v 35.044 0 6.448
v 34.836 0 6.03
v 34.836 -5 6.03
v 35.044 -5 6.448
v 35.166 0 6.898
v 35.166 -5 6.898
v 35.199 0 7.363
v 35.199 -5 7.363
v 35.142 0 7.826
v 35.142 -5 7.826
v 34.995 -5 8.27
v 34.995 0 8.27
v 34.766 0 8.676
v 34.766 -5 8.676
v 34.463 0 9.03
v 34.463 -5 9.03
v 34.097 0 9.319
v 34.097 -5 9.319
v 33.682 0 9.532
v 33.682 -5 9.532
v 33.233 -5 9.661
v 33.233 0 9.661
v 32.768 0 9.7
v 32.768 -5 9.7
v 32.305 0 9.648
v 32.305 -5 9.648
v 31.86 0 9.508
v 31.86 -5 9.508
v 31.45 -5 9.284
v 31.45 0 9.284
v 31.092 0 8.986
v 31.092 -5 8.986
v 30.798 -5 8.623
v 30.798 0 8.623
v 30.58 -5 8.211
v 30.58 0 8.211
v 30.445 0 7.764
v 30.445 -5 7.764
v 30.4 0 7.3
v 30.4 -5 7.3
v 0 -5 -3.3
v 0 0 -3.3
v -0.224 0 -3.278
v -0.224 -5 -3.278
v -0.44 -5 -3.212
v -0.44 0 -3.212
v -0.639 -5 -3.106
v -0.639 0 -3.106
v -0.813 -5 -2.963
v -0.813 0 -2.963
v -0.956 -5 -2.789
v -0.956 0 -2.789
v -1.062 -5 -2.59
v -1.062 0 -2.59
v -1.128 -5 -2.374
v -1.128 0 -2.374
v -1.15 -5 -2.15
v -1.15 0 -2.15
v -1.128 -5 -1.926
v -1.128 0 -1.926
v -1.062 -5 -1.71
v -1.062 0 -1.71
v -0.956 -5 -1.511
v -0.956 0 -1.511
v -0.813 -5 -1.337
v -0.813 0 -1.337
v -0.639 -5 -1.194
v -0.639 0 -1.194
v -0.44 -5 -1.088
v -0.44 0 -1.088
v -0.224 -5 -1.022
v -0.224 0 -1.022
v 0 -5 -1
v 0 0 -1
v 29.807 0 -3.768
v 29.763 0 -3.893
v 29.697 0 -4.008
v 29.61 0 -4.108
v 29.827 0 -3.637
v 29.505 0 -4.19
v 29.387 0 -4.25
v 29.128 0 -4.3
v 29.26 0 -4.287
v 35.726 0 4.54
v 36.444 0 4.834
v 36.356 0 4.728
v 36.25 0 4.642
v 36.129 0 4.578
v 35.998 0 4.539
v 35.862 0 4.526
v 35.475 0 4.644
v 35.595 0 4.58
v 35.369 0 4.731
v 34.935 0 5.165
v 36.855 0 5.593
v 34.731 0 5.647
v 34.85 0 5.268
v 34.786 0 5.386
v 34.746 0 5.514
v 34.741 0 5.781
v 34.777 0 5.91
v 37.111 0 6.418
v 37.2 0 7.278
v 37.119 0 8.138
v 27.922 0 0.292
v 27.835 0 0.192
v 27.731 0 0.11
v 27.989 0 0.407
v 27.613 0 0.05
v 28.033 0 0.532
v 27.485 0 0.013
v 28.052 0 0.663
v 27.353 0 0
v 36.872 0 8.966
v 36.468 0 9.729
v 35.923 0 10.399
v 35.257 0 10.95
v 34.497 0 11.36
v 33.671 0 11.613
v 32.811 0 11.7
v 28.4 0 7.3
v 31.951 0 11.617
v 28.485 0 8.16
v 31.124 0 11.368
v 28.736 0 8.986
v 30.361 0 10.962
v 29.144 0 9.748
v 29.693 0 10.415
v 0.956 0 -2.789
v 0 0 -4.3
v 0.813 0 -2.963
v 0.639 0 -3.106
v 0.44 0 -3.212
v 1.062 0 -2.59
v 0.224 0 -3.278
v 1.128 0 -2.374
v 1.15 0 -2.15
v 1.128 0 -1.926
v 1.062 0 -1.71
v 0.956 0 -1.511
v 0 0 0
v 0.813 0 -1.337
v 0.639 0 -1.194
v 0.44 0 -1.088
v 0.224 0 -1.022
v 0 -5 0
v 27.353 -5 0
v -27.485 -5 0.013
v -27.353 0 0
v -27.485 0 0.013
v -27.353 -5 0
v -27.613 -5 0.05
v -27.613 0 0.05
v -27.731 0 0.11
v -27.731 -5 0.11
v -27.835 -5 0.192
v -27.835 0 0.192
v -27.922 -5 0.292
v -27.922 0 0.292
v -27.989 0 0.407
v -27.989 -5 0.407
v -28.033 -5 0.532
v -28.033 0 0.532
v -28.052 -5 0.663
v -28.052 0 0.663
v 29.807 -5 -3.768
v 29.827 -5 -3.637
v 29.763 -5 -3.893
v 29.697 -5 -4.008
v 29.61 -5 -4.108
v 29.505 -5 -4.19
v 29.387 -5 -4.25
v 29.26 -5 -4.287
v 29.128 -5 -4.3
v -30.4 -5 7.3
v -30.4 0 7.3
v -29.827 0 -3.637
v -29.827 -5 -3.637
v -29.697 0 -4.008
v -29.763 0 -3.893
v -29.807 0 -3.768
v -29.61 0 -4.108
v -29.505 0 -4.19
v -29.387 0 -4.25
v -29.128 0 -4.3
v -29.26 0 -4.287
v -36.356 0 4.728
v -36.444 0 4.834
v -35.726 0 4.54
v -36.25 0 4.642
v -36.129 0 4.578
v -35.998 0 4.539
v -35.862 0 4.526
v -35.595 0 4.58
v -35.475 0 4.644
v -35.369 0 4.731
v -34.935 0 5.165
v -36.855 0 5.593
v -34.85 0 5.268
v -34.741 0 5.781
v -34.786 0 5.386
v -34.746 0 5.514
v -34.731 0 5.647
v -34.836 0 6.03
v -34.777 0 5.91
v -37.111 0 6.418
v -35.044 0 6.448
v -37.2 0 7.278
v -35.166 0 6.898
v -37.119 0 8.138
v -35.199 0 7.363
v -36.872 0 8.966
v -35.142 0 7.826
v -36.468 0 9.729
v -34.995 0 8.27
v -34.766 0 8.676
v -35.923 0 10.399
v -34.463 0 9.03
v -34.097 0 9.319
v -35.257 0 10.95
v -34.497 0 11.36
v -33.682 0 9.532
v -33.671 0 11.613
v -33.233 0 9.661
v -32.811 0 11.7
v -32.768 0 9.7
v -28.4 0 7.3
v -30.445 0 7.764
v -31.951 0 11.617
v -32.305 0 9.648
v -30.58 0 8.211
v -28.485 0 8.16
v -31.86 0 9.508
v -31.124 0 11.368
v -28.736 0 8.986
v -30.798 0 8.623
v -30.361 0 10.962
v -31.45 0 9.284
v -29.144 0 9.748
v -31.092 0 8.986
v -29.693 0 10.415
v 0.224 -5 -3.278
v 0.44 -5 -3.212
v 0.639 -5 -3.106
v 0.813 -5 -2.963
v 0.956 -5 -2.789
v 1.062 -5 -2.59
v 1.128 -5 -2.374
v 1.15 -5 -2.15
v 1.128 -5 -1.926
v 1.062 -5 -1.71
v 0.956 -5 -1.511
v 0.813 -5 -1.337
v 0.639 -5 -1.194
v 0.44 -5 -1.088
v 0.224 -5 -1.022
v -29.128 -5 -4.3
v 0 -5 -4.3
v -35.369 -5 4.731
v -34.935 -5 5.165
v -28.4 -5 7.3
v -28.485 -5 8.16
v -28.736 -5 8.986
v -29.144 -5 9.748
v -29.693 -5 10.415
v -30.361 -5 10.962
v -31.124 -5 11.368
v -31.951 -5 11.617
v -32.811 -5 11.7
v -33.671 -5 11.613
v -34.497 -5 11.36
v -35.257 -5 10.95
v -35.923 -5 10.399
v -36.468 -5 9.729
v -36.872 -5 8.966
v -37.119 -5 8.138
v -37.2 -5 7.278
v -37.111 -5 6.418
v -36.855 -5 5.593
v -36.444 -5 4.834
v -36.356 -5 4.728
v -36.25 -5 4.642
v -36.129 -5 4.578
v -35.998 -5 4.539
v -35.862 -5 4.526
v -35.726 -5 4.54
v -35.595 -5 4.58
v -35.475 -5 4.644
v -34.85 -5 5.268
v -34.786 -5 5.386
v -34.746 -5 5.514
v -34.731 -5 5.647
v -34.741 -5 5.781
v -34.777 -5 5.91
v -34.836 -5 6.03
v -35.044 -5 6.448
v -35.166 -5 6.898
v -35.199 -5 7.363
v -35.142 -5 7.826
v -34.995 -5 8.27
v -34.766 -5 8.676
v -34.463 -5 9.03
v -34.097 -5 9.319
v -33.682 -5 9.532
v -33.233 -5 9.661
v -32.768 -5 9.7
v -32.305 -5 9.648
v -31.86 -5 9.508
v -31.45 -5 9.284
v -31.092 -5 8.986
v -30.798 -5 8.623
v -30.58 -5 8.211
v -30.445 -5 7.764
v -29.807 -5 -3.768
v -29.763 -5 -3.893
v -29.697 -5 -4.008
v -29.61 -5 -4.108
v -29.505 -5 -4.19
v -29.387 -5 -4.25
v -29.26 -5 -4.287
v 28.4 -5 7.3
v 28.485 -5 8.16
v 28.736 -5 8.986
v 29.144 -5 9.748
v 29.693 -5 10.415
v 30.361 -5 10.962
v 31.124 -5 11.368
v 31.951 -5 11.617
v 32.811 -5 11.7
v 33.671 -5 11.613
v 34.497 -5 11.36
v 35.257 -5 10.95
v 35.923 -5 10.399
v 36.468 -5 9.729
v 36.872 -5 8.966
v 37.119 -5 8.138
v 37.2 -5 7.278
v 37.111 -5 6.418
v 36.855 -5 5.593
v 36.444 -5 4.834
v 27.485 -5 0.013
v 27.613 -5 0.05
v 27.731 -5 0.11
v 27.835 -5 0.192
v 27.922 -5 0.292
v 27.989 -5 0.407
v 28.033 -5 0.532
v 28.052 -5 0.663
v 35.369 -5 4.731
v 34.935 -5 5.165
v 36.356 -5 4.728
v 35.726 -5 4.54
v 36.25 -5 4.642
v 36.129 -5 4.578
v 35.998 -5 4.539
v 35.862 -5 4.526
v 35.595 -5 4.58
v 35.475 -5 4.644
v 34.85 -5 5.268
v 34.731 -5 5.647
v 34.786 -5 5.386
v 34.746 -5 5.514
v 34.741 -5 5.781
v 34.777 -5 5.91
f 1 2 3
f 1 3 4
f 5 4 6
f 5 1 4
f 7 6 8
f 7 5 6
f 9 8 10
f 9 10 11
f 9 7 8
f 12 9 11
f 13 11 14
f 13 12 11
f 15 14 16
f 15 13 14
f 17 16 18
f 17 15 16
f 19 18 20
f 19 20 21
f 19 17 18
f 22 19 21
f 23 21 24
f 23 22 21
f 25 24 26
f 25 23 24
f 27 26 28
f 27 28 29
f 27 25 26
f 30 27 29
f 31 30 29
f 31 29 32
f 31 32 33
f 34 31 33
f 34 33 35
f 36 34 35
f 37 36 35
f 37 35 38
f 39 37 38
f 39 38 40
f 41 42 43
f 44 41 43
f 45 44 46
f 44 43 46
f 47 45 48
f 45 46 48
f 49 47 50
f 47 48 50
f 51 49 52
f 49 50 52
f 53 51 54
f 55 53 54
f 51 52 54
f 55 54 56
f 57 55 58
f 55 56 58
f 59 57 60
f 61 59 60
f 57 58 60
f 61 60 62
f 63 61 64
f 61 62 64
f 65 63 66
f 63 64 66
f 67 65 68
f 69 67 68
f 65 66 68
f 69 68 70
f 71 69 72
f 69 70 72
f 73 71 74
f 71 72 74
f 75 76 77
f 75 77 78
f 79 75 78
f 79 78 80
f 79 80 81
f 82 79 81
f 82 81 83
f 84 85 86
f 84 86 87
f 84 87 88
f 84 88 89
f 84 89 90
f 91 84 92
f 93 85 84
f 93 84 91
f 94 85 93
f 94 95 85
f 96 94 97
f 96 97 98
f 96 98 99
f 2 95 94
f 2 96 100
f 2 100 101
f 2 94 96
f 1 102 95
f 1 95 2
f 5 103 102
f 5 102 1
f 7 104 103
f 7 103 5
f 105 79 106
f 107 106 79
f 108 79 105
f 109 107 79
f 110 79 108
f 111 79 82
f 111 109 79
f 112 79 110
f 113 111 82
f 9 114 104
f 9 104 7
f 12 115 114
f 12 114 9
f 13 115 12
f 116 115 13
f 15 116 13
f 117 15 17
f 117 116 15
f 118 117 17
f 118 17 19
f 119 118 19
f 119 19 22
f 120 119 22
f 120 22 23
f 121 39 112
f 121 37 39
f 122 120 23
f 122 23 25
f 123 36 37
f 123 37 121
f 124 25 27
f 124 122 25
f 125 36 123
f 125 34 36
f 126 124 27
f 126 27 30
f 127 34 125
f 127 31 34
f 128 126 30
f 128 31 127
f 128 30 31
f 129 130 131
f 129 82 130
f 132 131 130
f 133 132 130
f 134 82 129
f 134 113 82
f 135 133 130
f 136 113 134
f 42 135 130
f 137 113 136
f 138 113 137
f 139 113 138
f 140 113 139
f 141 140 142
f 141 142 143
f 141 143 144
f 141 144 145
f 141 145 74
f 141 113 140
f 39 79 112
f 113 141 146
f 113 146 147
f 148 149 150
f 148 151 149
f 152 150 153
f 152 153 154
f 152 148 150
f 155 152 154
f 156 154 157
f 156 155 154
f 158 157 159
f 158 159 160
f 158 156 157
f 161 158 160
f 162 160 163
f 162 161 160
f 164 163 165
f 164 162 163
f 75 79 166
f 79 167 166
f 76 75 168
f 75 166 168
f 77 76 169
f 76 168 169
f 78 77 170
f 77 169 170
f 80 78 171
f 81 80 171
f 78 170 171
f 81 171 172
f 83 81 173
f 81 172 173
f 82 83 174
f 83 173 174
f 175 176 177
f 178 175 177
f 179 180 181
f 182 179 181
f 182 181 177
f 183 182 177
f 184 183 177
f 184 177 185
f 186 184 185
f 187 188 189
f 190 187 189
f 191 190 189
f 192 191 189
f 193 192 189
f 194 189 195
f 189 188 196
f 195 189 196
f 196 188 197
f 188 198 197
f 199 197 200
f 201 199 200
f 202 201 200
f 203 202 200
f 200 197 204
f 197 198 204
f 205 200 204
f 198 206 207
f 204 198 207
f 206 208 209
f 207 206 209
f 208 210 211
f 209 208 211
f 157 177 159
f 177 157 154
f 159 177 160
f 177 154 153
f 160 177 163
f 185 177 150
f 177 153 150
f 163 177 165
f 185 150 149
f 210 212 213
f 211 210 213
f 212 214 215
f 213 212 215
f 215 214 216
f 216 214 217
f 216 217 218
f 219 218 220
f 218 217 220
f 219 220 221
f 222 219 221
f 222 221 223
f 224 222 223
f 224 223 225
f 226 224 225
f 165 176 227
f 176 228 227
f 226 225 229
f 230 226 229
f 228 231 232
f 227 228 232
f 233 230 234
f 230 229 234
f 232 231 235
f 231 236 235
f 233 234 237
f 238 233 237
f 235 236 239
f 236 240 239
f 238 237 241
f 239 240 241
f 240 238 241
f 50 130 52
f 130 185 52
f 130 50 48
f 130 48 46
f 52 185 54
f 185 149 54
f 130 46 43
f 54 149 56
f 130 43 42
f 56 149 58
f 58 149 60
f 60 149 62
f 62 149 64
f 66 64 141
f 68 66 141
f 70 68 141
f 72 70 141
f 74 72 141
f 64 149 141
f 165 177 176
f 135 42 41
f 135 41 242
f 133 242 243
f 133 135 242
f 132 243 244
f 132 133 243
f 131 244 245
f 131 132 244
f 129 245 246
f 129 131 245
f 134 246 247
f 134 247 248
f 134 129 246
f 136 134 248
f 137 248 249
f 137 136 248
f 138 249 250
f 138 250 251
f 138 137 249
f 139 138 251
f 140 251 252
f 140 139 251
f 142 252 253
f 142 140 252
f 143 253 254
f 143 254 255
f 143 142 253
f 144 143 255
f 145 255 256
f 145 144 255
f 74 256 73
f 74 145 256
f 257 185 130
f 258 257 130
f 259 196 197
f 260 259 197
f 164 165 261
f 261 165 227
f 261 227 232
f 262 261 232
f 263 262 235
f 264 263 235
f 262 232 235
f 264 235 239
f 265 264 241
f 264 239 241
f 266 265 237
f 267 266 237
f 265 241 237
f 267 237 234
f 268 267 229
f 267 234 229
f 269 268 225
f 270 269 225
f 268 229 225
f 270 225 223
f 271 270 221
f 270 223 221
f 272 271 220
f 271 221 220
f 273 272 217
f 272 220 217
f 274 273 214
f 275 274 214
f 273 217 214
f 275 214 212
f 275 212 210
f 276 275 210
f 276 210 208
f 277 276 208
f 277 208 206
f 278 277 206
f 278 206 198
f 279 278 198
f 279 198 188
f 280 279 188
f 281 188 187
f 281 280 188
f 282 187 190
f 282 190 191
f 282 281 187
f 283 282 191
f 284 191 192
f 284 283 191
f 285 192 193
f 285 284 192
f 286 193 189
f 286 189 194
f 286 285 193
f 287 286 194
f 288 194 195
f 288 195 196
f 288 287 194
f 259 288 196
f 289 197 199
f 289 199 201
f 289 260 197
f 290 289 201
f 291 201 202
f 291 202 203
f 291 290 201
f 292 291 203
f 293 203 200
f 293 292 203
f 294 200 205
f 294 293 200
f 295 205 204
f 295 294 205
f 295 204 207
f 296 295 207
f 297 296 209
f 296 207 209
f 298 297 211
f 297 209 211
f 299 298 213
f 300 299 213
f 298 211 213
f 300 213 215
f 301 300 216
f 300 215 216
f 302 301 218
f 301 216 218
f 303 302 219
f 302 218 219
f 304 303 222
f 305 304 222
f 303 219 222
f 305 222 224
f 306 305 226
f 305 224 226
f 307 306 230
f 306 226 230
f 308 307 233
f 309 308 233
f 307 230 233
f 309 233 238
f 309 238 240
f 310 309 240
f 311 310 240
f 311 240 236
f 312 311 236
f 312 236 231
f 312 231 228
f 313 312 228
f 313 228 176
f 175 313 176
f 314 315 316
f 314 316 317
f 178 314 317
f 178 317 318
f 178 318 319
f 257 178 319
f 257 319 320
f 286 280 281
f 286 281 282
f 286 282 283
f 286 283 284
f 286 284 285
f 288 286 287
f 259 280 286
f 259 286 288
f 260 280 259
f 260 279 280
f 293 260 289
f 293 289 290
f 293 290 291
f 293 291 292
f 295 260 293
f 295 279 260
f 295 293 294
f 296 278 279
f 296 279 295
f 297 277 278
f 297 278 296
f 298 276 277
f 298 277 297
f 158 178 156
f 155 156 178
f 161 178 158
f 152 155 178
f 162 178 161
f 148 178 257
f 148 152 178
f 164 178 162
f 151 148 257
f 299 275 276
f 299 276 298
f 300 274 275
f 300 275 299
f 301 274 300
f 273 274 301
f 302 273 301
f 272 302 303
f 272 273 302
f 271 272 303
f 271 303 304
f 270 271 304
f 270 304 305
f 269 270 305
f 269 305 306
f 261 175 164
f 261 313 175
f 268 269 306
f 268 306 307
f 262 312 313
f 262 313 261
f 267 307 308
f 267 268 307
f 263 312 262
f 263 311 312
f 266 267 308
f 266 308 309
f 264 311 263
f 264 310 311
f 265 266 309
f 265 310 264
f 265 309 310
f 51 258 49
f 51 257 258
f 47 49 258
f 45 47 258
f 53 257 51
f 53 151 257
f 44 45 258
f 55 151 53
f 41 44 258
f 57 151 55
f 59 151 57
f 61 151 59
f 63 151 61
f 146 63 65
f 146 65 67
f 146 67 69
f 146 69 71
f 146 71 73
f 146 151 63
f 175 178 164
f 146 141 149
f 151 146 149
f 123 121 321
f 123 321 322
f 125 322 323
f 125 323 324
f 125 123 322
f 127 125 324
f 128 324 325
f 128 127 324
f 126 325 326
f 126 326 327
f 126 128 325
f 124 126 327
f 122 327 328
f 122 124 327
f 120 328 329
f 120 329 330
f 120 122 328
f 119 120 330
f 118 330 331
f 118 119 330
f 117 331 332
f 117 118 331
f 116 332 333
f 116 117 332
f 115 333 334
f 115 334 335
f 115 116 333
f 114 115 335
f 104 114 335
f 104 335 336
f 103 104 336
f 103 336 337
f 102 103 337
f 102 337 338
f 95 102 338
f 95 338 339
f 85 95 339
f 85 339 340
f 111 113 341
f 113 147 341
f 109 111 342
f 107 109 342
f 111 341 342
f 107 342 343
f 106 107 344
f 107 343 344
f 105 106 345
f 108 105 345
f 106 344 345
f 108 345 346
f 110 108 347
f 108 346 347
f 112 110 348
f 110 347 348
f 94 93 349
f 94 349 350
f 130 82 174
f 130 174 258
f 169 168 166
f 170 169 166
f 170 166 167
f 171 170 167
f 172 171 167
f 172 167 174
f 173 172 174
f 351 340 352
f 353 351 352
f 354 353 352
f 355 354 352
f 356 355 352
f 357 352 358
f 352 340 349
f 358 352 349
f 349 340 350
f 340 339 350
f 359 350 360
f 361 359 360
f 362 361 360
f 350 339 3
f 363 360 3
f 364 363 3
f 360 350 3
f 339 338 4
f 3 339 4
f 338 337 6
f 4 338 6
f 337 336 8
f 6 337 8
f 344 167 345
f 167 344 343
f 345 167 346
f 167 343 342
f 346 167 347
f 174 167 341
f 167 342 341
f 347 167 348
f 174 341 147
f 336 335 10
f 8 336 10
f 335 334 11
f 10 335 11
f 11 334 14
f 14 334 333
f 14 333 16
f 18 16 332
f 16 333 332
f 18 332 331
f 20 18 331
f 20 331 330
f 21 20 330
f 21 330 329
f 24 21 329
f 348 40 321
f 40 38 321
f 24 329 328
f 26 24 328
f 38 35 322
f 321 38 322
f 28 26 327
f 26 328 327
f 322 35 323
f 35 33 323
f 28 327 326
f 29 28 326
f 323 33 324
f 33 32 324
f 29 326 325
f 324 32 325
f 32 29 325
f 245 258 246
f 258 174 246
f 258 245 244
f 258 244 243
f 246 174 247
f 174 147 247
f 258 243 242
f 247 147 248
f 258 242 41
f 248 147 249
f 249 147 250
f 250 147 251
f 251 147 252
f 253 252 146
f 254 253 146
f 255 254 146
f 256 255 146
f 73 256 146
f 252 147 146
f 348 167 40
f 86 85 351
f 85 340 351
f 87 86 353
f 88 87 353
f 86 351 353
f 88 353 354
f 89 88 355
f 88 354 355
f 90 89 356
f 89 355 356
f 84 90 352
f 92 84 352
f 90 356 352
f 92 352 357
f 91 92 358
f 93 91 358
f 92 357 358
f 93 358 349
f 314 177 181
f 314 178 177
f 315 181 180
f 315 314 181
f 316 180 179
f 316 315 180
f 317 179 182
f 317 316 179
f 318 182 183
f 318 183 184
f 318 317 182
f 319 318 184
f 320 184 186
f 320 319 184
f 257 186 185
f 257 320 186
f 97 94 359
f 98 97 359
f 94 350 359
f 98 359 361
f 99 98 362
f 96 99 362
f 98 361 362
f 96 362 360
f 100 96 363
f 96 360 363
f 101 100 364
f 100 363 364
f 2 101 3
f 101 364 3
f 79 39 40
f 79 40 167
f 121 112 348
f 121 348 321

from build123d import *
from build123d import SkipClean  # not in build123d's __all__

# Parameters (mm, degrees)
F1_DEPTH = 5
F2_R     = 0.7


with BuildPart() as f1:
    # F0 (on Front) → F1 (new body)
    with BuildSketch(Plane.XZ):
        with BuildLine():
            Line((0, -1), (0, 0))
            Line((0, 0), (-28.0174232112, 0))
            Line((-28.0174232112, 0), (-28.4, 7.3))
            ThreePointArc((-28.4, 7.3), (-34.4838071024, 11.365069943), (-35.9112698372, 4.1887301628))
            Line((-35.9112698372, 4.1887301628), (-34.4970562748, 5.6029437252))
            ThreePointArc((-34.4970562748, 5.6029437252), (-33.7184402377, 9.517310878), (-30.4, 7.3))
            Line((-30.4, 7.3), (-29.7920697603, -4.3))
            Line((-29.7920697603, -4.3), (0, -4.3))
            Line((0, -4.3), (0, -3.3))
            ThreePointArc((0, -3.3), (-1.15, -2.15), (0, -1))
        make_face()
    extrude(amount=F1_DEPTH)

    # F2
    f2_edges = [f1.edges().sort_by_distance(p)[0] for p in [
        (-28.017423, -2.5, 0),
        (-29.79207, -2.5, -4.3),
        (-34.497056, -2.5, 5.602944),
        (-35.91127, -2.5, 4.18873),
    ]]
    fillet(f2_edges, radius=F2_R)

    # F3: F1 across plane


with BuildPart() as f1_1:
    add(f1.part, clean=False)
    with SkipClean():  # cleaning this boolean's faces spoils the solid; the shape is the same uncleaned
        add(f1.part.mirror(Plane.YZ), clean=False)


solid = f1_1.part
